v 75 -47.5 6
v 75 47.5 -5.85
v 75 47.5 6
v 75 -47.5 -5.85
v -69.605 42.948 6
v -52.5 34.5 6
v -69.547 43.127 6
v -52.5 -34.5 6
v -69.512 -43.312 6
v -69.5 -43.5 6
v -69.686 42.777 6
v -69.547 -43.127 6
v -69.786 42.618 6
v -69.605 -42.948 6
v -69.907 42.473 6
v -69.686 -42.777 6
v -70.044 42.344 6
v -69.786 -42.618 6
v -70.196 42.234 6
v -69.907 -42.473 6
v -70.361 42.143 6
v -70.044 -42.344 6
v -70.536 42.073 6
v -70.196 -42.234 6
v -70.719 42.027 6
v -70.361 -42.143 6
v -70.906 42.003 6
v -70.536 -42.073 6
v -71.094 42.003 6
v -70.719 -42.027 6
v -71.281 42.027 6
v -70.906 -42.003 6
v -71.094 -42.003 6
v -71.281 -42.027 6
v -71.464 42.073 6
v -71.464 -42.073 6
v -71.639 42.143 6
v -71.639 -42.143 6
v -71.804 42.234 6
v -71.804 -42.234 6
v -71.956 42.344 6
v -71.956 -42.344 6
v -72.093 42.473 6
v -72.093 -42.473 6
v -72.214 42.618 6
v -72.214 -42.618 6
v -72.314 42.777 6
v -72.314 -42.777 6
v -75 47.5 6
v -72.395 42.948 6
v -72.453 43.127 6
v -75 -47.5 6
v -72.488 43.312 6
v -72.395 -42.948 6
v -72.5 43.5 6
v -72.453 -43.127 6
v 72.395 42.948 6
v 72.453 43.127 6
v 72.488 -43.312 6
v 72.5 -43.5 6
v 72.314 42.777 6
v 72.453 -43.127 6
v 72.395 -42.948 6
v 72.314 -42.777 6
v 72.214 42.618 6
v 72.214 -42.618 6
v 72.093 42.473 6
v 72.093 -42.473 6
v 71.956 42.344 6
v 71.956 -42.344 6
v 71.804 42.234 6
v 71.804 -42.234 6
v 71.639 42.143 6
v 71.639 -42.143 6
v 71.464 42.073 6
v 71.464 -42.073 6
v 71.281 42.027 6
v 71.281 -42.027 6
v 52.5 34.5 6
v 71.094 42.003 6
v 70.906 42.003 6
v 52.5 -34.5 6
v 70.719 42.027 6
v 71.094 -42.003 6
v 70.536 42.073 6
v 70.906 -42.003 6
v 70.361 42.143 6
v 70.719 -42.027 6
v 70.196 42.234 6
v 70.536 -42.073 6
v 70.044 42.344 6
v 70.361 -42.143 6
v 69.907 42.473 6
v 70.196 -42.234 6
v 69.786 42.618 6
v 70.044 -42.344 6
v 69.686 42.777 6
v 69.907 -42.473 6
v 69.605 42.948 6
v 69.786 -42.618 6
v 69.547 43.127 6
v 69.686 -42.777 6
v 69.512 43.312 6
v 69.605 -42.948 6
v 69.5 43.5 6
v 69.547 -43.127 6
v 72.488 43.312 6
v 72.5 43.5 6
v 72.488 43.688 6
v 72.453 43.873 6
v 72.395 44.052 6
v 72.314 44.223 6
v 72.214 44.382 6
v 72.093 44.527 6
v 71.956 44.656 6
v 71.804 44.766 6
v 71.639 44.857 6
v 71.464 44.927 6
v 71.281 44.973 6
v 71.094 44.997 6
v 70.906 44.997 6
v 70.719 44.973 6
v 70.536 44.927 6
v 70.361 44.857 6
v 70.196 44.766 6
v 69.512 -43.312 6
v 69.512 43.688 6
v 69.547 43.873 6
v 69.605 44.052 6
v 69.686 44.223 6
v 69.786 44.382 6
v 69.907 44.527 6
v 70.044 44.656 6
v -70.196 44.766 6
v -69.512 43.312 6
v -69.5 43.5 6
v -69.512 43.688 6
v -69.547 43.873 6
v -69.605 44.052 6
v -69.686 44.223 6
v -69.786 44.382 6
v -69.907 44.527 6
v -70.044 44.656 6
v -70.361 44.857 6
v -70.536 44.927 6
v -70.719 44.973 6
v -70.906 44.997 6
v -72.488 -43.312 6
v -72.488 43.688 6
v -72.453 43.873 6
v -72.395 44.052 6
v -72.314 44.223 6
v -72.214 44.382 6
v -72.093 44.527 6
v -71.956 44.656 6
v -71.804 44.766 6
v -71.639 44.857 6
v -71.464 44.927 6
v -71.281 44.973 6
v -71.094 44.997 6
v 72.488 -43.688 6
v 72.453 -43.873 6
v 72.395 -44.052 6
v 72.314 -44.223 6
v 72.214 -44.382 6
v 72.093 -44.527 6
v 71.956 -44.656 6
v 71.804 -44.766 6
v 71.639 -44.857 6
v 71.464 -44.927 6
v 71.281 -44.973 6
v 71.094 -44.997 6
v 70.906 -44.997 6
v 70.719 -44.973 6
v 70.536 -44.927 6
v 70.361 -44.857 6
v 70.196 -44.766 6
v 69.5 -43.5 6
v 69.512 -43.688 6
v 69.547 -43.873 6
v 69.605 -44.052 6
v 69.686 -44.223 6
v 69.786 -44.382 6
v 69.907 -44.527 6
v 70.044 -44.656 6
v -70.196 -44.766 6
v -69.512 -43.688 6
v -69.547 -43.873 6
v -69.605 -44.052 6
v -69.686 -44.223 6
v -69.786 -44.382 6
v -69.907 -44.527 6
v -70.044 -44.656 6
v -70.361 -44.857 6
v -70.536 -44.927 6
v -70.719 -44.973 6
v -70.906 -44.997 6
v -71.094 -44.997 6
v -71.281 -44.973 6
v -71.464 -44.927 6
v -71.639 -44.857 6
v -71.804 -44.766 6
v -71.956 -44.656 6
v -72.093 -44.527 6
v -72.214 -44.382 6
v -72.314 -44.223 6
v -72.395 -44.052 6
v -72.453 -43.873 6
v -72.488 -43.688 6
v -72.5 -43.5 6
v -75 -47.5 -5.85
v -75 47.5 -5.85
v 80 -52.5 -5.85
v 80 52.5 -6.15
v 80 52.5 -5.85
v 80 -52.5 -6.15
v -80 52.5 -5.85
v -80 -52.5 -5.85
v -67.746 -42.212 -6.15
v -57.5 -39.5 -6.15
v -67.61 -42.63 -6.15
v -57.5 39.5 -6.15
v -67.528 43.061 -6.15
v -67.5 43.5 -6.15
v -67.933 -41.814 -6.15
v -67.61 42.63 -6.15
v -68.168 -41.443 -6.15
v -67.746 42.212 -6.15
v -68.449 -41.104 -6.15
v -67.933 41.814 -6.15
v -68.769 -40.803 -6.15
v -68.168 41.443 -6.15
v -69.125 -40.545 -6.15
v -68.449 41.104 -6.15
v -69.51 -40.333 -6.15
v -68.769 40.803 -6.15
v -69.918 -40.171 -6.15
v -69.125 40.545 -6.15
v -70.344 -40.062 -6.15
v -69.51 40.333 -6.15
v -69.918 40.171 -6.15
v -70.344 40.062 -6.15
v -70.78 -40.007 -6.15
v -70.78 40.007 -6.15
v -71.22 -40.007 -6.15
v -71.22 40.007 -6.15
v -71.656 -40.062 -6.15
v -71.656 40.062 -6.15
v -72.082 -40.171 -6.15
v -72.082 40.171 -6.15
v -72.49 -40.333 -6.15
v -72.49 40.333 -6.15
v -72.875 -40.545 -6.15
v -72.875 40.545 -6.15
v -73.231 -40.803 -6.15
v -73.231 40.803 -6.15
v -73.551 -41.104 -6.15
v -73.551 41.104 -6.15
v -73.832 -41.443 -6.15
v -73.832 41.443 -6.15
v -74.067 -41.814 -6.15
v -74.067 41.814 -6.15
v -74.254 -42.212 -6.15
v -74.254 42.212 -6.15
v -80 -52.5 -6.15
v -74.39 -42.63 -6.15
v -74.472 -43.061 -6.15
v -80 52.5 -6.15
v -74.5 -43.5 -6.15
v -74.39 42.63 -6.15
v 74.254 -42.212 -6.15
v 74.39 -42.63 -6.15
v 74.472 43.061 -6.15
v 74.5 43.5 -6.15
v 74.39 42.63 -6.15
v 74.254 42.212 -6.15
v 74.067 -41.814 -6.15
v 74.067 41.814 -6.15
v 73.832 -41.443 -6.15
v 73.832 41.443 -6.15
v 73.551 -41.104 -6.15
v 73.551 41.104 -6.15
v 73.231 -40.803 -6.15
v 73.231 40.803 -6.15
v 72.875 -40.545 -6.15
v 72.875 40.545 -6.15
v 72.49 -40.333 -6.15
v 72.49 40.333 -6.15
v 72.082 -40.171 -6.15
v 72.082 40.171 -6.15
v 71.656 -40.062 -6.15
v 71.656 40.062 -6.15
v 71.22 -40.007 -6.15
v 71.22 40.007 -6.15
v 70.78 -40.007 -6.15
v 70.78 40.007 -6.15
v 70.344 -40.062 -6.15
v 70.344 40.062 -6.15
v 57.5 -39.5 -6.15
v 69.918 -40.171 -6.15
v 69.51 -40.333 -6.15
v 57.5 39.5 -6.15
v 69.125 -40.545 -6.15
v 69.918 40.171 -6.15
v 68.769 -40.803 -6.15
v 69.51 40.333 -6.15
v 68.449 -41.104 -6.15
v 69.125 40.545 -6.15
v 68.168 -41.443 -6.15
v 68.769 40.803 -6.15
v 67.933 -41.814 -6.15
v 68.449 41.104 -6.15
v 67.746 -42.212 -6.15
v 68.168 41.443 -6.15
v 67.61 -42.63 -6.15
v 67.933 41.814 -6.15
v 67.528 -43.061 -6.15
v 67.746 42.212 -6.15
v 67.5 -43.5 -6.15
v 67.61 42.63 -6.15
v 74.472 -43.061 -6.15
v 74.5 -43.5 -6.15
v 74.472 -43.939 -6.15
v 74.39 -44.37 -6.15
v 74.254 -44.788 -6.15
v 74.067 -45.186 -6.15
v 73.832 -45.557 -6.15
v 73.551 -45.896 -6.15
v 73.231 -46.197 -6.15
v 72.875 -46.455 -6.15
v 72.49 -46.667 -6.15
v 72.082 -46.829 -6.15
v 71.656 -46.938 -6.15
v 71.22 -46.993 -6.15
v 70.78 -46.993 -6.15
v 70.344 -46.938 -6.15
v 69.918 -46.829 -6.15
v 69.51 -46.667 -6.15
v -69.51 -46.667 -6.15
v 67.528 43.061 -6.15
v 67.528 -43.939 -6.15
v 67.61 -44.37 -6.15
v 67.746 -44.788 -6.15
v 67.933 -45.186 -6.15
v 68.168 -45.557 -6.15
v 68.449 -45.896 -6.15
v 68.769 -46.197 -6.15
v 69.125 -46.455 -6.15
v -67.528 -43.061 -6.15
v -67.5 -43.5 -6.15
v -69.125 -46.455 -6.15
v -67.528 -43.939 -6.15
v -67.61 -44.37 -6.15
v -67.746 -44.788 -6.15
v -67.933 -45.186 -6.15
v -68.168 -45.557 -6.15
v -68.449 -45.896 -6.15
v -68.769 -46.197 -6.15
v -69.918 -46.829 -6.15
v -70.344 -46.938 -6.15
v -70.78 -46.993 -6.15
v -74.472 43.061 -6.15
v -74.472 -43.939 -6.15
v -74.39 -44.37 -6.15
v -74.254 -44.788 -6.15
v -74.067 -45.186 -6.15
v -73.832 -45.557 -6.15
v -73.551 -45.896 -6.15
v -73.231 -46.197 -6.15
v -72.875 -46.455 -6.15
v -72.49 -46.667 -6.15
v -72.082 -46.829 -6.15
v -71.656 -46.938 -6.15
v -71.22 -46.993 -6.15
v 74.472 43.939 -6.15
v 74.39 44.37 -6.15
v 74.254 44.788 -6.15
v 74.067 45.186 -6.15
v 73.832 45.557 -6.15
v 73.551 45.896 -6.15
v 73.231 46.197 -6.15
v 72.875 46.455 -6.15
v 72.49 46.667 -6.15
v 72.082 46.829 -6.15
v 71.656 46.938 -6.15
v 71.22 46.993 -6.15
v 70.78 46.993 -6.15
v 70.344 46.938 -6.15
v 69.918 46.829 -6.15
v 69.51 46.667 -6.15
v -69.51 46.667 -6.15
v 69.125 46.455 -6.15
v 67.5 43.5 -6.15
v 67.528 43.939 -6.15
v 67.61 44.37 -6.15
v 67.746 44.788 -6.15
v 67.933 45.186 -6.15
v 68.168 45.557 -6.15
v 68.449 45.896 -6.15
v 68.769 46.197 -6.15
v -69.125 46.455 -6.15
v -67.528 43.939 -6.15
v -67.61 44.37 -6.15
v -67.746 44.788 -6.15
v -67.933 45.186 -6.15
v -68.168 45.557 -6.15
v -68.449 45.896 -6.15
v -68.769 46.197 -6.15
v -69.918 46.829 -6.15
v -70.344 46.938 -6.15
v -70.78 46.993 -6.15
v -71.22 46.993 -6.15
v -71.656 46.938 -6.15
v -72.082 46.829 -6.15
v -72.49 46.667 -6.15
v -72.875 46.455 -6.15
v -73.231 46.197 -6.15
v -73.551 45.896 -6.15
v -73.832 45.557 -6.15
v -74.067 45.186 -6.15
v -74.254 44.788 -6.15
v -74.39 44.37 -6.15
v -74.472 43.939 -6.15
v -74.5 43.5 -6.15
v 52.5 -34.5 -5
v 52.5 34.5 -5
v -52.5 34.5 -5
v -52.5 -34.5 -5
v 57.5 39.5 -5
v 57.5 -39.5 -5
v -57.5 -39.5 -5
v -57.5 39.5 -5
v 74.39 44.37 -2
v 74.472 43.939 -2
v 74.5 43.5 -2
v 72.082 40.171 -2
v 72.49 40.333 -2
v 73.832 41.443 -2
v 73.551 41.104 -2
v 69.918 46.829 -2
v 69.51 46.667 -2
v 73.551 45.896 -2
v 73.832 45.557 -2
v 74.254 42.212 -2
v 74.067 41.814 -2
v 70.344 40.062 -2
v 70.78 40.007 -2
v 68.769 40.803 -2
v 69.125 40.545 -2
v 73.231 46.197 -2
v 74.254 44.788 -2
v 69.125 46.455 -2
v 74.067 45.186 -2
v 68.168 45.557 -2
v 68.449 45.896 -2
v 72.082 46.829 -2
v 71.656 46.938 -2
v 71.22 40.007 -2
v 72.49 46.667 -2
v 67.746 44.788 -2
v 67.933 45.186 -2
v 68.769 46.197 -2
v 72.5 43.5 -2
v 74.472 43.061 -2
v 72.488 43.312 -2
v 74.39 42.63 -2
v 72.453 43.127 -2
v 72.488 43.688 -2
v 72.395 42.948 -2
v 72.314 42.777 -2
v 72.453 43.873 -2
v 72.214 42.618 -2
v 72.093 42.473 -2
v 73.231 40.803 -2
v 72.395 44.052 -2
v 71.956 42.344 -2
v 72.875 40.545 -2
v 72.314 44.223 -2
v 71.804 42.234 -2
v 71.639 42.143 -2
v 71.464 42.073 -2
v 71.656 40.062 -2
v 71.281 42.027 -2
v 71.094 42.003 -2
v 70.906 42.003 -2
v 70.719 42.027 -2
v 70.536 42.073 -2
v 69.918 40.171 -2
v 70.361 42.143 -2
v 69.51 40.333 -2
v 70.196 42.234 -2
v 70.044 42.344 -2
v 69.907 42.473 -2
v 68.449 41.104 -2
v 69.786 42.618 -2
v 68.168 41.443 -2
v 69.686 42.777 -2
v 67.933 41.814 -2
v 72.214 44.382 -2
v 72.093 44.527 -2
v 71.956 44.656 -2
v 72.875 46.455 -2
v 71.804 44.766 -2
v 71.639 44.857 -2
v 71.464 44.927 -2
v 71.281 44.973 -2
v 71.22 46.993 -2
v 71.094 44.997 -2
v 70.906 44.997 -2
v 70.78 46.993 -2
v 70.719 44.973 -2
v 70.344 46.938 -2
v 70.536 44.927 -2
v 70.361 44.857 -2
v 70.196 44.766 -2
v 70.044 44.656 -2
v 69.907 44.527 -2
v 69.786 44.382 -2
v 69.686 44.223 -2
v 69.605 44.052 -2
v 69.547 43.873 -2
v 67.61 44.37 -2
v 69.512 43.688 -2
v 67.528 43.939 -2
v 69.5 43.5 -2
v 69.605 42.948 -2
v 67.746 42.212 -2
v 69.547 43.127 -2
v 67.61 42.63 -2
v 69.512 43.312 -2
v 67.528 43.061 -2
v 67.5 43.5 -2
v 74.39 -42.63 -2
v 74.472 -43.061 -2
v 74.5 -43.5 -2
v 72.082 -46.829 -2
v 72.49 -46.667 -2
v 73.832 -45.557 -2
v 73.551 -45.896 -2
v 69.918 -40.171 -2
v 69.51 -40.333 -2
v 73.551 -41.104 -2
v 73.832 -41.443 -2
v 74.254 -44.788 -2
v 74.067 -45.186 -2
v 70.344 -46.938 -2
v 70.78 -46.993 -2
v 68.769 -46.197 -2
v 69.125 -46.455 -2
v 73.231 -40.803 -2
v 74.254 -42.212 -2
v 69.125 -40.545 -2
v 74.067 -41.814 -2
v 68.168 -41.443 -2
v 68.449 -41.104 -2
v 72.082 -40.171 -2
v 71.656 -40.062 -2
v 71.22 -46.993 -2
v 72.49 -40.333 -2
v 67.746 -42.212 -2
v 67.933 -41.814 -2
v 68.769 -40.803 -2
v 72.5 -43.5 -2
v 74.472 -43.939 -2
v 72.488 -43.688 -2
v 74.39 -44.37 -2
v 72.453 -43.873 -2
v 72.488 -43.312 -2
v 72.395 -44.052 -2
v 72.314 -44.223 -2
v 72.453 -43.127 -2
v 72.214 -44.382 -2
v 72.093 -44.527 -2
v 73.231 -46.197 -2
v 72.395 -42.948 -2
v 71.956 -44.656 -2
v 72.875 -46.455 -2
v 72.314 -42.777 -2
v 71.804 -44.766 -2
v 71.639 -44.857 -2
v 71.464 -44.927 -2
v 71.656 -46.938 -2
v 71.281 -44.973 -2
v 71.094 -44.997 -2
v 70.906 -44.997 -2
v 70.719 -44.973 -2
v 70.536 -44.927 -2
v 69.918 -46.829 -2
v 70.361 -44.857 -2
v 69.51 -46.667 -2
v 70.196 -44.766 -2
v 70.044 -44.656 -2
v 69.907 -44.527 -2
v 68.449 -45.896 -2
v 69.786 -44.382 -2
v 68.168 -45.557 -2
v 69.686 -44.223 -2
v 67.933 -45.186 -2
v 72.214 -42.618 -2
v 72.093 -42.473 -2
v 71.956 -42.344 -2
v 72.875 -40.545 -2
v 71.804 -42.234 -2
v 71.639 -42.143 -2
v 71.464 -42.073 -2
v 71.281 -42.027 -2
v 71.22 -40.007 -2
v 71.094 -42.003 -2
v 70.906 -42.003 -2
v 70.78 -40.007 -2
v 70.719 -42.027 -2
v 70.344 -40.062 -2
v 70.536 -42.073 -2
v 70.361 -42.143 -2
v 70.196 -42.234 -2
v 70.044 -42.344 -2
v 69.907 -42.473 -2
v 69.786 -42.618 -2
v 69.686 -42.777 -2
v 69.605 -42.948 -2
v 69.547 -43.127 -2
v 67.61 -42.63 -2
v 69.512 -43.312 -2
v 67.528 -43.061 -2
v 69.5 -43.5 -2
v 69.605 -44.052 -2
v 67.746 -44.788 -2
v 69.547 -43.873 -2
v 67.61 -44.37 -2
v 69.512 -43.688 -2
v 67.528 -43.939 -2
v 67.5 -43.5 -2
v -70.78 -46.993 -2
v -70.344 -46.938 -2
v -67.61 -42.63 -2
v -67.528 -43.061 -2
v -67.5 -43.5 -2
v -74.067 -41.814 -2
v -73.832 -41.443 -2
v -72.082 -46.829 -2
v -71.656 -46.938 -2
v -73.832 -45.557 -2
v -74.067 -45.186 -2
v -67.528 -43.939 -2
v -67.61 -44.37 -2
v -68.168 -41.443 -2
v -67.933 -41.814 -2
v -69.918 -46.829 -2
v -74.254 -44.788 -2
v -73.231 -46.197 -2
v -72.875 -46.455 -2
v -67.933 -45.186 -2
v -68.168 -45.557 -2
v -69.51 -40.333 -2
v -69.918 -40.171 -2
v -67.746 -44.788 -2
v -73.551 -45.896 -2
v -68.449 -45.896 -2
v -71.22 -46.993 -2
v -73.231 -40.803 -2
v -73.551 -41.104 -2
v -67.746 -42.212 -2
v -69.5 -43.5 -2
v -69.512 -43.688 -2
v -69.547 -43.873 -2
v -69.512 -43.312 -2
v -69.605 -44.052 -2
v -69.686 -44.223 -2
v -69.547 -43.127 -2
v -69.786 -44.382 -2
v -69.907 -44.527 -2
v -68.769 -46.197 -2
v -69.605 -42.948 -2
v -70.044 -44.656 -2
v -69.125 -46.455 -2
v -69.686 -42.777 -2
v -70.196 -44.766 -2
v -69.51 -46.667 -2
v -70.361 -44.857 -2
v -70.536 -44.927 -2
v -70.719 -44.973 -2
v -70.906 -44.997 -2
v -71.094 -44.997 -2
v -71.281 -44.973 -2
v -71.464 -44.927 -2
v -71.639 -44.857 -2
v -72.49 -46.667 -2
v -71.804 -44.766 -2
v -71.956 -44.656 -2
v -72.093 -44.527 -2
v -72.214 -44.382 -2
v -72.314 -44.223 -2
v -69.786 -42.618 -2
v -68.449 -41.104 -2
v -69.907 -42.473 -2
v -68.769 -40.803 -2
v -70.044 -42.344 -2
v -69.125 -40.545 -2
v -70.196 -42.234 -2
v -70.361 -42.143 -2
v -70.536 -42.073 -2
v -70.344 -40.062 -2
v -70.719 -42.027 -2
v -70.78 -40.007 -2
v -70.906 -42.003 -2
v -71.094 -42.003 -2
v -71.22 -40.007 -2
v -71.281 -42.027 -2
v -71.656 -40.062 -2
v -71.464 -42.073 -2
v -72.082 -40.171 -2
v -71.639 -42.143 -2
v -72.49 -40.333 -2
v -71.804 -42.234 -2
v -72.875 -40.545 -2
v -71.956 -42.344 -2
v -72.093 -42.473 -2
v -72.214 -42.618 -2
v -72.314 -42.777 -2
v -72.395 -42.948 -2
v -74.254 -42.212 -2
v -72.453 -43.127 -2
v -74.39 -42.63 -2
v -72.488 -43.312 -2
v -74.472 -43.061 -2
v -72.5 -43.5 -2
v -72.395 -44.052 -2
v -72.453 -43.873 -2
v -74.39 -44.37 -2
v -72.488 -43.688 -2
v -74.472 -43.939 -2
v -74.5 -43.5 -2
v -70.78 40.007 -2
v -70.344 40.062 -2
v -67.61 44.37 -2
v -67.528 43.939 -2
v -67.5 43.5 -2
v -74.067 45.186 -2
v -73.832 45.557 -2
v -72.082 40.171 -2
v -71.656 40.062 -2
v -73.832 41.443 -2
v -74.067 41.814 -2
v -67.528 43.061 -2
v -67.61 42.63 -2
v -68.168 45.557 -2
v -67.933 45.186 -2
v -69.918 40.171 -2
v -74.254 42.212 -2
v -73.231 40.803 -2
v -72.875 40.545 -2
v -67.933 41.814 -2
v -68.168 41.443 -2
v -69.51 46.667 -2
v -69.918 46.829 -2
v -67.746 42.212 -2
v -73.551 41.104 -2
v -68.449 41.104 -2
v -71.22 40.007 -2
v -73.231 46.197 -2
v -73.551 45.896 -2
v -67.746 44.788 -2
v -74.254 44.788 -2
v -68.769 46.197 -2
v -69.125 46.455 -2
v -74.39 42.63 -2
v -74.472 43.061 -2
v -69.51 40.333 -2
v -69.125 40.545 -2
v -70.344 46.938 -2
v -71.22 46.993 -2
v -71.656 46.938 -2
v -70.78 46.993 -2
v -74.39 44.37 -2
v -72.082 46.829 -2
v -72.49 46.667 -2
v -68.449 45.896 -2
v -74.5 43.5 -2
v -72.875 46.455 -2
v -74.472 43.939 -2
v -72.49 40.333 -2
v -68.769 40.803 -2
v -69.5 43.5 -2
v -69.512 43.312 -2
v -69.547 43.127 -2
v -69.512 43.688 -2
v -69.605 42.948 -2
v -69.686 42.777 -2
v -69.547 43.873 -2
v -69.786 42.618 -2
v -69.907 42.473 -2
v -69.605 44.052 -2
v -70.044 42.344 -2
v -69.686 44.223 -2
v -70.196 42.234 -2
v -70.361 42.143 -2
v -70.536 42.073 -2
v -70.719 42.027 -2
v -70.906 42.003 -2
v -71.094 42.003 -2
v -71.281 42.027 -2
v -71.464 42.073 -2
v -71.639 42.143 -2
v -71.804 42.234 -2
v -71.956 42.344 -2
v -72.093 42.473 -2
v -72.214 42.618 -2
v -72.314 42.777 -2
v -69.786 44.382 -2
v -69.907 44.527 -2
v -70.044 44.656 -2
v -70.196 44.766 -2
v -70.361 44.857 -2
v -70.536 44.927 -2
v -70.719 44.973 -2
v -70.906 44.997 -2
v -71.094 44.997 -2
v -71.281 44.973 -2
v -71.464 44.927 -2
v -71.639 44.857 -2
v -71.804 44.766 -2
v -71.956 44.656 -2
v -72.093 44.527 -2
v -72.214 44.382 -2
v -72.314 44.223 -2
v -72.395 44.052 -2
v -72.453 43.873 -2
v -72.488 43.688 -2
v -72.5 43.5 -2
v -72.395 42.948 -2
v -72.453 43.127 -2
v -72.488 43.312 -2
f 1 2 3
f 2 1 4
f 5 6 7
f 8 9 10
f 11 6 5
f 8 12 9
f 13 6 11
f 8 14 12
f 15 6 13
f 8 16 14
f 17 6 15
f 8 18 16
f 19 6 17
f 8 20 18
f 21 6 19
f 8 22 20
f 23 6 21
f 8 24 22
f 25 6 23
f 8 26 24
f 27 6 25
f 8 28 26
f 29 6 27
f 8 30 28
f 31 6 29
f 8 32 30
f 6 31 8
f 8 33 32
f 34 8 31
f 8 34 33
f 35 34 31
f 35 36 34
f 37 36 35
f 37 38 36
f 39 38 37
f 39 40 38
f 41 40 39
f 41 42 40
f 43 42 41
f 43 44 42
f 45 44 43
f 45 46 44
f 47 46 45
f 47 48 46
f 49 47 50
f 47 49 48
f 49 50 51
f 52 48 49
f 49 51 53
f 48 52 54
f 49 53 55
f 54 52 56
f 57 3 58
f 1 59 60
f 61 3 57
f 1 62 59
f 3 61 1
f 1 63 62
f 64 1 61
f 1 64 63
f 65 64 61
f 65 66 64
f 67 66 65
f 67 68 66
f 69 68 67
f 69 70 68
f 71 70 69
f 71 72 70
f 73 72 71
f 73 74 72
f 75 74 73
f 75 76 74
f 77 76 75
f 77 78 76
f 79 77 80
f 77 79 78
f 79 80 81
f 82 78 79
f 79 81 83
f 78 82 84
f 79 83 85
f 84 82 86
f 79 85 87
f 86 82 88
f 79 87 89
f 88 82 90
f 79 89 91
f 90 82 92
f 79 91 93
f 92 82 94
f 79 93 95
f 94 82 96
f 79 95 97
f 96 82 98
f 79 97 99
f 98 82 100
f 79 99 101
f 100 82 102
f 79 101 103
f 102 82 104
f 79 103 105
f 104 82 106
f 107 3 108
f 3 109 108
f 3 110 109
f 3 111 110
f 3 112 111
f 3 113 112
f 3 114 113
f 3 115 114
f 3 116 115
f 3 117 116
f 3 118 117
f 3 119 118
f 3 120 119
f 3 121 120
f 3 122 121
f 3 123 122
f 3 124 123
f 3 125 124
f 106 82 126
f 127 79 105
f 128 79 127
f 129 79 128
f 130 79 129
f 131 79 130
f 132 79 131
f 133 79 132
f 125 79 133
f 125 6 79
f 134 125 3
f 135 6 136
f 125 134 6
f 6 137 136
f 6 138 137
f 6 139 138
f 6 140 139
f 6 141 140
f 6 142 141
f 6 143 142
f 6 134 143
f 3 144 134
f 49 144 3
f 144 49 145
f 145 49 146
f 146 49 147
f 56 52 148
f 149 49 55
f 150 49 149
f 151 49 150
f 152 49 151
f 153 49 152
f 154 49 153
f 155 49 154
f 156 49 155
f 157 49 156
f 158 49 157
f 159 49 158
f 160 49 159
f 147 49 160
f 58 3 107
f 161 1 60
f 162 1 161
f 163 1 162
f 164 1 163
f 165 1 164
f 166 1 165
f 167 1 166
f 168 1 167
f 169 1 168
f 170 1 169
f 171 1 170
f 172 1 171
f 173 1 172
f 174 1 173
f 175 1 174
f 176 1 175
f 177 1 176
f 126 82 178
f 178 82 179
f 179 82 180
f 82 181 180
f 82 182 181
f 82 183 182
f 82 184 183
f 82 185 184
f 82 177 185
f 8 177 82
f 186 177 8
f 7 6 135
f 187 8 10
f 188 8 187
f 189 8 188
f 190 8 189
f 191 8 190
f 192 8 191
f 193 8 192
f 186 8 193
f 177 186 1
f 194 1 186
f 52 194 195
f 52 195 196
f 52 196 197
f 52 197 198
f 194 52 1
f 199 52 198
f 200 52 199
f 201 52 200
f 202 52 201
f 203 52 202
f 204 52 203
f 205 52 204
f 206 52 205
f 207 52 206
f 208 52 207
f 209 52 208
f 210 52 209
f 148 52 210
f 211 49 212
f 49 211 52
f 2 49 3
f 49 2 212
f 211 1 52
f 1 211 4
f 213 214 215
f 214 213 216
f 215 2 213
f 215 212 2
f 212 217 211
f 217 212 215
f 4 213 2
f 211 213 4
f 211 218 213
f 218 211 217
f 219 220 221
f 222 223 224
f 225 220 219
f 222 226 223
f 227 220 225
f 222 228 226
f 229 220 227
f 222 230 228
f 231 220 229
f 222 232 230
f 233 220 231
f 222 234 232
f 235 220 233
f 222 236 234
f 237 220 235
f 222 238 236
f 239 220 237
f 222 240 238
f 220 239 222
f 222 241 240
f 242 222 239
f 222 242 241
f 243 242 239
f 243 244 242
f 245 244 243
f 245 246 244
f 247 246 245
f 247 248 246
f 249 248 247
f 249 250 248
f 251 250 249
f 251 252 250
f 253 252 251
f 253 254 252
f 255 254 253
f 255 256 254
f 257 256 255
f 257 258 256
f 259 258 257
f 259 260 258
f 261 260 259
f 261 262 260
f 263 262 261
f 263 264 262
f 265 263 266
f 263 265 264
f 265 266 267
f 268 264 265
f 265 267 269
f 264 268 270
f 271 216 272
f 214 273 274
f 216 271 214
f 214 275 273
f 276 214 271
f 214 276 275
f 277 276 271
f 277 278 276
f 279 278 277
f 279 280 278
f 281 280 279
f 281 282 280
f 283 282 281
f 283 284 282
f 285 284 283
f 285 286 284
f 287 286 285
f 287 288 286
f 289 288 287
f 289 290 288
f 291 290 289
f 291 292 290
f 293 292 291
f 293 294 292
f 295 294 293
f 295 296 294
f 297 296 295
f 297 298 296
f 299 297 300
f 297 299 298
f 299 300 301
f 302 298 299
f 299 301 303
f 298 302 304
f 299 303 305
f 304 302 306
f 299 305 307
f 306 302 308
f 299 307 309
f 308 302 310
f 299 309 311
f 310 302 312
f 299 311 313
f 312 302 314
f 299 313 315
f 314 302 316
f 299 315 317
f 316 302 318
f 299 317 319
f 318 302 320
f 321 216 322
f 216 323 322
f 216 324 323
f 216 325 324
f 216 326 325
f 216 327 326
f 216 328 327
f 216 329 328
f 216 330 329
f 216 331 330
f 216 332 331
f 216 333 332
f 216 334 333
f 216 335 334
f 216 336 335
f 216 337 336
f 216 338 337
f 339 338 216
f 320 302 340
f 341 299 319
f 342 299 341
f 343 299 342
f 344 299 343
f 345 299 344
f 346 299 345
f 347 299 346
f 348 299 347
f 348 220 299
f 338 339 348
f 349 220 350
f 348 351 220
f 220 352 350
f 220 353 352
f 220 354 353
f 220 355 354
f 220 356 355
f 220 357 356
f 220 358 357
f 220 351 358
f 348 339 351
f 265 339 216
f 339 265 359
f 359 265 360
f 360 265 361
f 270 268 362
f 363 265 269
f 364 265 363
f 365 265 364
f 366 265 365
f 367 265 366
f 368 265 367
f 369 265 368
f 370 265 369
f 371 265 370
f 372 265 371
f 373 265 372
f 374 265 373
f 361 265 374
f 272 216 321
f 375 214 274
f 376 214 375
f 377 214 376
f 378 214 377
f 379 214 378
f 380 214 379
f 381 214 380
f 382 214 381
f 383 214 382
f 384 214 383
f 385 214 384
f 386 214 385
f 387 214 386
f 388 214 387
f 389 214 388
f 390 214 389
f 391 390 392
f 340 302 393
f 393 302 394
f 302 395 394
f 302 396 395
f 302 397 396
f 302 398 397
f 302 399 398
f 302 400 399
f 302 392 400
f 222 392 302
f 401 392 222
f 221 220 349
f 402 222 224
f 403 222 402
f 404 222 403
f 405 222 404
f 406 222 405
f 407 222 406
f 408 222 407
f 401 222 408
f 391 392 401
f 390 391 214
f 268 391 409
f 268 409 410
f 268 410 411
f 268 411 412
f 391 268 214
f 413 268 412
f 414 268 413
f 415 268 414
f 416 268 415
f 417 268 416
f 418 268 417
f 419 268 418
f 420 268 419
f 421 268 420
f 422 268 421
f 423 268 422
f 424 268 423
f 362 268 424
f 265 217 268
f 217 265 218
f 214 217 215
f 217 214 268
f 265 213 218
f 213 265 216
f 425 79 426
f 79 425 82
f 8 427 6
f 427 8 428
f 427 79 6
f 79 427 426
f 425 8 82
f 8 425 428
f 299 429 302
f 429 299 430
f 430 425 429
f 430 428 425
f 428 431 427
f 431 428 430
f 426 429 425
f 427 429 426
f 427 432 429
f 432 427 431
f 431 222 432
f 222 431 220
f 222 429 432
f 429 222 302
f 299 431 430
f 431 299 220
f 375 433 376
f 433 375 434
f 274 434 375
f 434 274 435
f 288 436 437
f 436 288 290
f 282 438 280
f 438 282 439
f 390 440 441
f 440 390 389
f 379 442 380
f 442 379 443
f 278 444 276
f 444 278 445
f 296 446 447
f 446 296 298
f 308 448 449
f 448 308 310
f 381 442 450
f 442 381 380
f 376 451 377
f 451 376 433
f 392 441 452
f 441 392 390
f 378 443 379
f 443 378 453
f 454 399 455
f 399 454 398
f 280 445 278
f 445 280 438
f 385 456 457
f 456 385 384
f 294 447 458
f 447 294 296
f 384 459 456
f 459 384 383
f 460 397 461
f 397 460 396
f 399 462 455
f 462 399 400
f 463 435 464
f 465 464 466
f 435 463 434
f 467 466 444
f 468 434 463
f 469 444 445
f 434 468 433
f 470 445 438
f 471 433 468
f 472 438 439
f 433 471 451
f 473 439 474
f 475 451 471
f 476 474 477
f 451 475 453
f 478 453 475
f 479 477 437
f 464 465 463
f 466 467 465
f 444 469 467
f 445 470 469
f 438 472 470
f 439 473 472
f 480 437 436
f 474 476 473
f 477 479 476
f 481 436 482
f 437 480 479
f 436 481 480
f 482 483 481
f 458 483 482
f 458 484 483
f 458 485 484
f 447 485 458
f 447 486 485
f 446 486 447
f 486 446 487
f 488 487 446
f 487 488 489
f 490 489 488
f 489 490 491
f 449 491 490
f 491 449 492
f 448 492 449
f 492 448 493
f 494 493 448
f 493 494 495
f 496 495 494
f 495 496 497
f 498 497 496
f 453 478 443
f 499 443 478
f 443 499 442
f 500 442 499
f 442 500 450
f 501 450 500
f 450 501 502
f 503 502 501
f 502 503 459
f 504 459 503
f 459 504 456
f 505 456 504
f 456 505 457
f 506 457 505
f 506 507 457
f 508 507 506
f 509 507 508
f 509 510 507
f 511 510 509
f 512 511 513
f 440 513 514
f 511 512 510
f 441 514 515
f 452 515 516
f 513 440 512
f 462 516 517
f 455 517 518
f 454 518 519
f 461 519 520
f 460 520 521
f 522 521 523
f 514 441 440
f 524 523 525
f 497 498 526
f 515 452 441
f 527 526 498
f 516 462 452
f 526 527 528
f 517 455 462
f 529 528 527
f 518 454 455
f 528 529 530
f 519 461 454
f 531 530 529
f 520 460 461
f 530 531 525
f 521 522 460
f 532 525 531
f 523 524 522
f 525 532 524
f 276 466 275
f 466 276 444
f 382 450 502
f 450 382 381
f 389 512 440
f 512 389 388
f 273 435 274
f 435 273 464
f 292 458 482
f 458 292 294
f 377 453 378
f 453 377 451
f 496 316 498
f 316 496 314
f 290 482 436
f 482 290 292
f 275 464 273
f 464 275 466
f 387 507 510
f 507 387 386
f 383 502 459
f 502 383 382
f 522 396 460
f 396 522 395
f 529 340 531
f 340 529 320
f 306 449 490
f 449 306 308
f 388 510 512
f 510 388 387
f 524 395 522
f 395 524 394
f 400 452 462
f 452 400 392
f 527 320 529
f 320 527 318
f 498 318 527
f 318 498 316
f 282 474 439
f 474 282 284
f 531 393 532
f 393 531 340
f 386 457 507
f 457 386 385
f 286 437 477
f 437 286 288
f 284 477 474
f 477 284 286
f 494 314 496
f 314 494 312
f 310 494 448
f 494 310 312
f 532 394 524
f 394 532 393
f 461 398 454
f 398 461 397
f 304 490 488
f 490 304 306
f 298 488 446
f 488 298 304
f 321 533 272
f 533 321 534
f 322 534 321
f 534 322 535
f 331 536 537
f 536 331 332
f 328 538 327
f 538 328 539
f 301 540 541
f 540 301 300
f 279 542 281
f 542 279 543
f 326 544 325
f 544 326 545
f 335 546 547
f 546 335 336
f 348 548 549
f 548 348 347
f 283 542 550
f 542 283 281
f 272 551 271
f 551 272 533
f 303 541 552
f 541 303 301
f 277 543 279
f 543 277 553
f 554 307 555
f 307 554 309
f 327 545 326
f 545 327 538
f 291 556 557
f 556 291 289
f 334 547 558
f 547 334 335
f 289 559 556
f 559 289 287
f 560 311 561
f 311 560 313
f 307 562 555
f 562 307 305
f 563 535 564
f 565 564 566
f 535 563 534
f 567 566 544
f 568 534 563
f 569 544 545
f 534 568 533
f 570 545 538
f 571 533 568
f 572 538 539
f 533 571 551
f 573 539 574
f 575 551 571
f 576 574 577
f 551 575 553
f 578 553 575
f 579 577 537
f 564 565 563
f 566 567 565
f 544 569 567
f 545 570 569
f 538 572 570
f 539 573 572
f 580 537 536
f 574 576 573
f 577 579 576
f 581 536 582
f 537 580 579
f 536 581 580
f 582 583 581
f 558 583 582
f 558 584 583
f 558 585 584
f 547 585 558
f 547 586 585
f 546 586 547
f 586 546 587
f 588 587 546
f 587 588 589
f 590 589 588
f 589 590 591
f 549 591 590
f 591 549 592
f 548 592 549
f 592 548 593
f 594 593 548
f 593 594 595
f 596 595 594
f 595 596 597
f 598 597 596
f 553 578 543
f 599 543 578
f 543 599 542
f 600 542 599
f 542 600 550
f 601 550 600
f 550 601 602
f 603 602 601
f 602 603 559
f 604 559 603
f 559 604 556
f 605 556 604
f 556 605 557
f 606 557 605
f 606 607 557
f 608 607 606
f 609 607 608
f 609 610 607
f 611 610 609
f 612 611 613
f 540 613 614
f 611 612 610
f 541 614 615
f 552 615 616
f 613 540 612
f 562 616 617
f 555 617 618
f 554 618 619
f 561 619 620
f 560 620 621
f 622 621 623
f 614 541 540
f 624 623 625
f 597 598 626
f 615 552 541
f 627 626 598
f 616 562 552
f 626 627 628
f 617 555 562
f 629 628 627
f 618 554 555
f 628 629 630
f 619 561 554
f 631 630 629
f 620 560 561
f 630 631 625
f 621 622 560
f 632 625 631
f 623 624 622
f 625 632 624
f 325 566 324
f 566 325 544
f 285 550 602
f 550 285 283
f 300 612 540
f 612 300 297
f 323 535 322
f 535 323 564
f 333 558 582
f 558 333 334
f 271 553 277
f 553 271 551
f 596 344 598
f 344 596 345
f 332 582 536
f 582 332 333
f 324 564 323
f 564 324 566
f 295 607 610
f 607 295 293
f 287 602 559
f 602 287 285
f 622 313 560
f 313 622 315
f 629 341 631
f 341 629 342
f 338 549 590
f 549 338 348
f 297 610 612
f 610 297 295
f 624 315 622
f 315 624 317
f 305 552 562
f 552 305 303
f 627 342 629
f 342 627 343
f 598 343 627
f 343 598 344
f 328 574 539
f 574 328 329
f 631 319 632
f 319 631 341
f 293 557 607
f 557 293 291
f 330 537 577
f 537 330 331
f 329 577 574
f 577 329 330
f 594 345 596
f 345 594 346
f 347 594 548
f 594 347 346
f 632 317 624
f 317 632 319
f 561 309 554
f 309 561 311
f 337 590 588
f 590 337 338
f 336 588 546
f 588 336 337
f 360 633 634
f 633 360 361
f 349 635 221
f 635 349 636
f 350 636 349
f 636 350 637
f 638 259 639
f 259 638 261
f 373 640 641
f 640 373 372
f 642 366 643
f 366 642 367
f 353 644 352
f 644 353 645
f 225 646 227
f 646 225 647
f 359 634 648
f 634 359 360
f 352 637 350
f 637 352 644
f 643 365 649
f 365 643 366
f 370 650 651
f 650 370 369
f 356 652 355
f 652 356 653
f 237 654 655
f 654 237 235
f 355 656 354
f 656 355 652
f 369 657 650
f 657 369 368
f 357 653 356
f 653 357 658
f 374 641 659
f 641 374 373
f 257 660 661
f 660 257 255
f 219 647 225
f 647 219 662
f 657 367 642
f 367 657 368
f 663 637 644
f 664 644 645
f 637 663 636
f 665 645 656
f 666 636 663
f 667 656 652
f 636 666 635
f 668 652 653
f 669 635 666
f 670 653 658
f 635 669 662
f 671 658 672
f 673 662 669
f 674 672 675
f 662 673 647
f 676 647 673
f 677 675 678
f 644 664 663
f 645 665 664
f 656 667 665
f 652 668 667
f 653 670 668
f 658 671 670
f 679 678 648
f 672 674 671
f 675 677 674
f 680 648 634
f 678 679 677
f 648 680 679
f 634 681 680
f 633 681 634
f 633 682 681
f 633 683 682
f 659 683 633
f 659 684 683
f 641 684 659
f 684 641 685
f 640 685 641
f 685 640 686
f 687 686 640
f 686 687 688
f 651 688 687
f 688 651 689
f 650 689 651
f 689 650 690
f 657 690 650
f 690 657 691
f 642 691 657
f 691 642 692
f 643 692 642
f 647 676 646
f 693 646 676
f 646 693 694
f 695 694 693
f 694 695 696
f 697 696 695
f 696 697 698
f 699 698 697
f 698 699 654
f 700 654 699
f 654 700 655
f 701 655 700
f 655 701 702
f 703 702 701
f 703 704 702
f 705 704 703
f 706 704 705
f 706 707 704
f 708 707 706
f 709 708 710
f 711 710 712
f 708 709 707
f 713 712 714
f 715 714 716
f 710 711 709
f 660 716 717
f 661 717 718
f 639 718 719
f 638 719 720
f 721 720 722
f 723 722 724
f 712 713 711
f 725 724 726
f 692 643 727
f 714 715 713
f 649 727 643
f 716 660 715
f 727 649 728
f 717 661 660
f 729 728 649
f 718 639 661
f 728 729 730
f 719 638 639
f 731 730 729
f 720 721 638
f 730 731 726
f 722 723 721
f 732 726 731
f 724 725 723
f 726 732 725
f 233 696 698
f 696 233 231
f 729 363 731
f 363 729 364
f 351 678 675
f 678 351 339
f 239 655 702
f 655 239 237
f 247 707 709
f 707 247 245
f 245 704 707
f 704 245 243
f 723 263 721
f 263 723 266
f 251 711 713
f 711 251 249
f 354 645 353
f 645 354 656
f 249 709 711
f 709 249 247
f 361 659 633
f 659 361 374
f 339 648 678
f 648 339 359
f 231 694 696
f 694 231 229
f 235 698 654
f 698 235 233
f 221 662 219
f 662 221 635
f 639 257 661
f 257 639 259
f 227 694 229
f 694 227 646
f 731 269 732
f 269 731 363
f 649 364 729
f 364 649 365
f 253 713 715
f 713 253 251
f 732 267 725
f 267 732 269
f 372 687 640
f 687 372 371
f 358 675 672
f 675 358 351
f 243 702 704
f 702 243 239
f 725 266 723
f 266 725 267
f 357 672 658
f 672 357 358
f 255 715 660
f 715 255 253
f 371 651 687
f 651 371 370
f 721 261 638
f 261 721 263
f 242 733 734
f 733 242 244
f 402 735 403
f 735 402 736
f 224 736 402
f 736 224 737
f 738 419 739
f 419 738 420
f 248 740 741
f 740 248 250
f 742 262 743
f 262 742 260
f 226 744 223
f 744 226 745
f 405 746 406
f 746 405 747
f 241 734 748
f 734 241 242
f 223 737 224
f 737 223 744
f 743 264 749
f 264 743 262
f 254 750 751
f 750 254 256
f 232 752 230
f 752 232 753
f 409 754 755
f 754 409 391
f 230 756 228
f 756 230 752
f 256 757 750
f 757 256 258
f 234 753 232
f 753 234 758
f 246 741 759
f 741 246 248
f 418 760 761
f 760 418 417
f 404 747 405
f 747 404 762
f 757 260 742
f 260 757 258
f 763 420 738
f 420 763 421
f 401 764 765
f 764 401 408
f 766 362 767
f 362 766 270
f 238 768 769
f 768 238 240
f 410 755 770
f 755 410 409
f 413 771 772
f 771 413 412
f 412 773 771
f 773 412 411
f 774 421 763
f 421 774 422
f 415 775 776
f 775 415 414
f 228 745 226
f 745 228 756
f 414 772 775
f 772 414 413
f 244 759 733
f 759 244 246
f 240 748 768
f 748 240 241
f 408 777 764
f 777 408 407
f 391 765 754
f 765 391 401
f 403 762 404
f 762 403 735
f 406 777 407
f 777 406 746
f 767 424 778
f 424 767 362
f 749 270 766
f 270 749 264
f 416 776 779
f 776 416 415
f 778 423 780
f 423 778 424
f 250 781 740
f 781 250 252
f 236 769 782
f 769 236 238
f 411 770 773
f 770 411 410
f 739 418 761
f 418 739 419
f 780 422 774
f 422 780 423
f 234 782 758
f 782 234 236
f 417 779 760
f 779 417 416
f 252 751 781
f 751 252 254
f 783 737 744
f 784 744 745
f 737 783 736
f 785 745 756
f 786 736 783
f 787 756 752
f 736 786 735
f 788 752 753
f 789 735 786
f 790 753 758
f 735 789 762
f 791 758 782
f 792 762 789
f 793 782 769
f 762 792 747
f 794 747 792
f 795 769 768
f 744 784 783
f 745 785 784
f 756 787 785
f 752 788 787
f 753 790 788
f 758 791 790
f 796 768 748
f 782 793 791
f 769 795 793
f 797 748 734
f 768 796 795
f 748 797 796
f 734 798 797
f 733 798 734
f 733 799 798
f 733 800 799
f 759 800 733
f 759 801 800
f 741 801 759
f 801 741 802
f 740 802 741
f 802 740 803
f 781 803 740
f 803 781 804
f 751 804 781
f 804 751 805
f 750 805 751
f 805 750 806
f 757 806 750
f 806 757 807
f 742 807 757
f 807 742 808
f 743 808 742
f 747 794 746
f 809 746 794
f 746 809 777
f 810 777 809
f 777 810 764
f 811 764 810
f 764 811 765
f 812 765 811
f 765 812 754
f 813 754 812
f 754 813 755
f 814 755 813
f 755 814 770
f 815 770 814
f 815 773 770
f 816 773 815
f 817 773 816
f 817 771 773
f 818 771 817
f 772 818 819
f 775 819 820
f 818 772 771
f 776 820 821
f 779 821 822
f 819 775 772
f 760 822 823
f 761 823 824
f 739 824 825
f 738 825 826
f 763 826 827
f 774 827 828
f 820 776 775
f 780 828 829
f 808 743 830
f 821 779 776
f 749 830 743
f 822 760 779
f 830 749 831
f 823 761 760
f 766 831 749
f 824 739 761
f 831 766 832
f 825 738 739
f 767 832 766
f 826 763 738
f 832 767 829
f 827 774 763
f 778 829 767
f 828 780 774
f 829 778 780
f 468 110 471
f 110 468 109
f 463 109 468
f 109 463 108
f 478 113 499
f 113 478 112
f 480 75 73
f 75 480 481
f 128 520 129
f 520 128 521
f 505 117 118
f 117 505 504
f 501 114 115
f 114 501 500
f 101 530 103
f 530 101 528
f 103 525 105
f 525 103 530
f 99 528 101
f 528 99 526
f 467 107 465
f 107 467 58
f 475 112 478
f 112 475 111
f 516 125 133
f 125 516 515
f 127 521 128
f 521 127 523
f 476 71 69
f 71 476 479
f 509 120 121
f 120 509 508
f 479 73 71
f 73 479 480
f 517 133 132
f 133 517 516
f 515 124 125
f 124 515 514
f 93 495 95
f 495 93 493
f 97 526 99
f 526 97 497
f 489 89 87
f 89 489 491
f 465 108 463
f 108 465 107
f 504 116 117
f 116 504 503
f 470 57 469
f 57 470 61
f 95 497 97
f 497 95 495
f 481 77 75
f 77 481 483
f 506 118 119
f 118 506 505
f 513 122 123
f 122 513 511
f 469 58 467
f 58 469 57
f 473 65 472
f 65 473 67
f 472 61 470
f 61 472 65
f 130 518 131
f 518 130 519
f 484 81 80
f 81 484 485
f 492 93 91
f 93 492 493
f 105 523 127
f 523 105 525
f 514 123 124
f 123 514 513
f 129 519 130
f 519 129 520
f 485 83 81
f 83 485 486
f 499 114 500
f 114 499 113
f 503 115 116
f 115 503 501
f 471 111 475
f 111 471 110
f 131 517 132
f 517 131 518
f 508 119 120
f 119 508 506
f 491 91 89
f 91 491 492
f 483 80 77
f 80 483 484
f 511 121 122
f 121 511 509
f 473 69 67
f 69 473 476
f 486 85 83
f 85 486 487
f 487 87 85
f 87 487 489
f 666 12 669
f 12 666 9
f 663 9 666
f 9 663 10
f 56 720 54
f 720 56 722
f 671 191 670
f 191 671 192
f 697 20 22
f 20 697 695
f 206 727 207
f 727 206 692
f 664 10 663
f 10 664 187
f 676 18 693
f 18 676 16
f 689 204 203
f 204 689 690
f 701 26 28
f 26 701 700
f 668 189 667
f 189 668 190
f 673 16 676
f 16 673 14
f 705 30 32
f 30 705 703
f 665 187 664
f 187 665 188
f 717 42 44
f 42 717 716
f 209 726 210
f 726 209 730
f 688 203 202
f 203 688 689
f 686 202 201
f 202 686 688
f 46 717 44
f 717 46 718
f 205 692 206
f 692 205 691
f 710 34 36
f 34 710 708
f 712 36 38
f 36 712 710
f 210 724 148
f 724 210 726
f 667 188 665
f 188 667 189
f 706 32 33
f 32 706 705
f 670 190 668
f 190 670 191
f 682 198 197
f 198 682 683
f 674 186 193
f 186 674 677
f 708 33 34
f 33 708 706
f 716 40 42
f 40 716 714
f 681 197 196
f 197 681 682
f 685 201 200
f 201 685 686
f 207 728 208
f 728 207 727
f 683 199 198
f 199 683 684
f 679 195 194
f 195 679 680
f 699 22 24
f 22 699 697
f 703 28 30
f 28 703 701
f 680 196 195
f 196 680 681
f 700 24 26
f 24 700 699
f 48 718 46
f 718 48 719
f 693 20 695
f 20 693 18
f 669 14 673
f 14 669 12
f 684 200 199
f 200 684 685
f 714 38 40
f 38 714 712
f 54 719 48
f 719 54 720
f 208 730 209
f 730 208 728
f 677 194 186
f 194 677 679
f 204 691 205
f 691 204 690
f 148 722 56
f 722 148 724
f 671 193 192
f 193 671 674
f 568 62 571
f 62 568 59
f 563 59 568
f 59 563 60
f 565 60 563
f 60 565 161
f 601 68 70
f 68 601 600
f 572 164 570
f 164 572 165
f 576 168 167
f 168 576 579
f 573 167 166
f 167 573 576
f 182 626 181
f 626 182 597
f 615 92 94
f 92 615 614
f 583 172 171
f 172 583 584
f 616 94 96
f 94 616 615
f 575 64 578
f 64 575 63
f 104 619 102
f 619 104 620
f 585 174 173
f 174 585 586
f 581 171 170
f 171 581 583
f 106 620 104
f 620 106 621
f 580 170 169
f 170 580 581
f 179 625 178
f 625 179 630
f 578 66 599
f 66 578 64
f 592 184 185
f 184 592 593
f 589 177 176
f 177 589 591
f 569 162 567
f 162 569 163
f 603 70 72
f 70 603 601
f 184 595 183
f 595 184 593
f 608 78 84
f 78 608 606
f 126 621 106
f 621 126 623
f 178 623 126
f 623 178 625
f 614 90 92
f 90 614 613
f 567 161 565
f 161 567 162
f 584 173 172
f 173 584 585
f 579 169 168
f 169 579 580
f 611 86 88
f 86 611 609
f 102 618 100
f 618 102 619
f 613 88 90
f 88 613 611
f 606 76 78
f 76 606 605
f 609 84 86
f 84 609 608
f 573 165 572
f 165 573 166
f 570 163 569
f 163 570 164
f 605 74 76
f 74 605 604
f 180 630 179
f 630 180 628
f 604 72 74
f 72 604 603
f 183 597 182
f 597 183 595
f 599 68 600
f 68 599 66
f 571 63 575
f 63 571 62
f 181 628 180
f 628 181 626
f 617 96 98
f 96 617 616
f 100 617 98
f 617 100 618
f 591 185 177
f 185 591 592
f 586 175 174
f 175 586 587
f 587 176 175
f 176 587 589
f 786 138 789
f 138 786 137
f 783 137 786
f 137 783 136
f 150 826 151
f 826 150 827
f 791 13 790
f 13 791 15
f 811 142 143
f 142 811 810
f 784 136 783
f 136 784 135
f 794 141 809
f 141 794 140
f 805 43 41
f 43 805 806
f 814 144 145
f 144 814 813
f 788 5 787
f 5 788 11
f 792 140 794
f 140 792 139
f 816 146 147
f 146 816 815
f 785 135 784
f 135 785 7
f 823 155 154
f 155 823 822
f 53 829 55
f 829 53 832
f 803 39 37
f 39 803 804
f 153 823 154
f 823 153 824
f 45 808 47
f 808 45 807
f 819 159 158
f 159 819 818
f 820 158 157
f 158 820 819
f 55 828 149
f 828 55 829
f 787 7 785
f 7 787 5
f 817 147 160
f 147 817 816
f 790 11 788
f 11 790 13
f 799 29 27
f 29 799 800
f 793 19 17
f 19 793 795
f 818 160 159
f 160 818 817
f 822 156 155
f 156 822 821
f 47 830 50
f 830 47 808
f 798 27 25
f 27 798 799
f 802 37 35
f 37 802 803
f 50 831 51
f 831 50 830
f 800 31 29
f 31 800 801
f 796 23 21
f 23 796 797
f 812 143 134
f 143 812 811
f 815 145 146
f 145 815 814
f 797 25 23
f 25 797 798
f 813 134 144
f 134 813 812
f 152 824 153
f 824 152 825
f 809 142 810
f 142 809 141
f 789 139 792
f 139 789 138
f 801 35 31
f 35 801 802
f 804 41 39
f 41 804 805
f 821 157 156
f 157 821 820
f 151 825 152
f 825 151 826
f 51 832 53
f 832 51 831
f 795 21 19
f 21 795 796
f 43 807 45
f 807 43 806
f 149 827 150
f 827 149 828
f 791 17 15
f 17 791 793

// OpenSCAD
// --------------------- Configurable Items ---------------------

$fn = 50*1;  // Quality of holes... above 50 not necessary for such small holes. (Hidden in Customizer)

// Width of hole in wall (all measurements in MM)
hole_width = 150;

// Height of hole in wall
hole_height = 95;

// T3 Retrofit Box Width
T3_width = 105;

// T3 Retrofit Box Height
T3_height = 69;

// T3 Front Lip Border
T3_indent_width = 5;

// T3 Front Lip depth (for T3 flush to wall)
T3_indent_depth = 2;

// Adapter Lip Border and Thickness
front_lip_width = 5 * 1;      // Orig 5, Hidden in Customizer
front_lip_thickness = .3 * 1;  // Orig .3, Hidden in Customizer

sheetrock_thickness = 12 * 1;  // Orig 12, Hidden in Customizer

// --------------------- Configurable Items ---------------------

cs_radius = 3.5 * 1;  // Hidden in Customizer
screw_radius = 1.5 * 1;  // Hidden in Customizer

difference()
{
    // Solid (Additive) Objects...
    
    union()
    {
        cube([hole_width, hole_height, sheetrock_thickness], true);
        translate([0,0,-(sheetrock_thickness / 2)])
        {
            cube([hole_width + (front_lip_width*2), hole_height + (front_lip_width*2), front_lip_thickness], true);
        }
    }

    // Hole (Subtractive) Objects...
    
    // T3 main body
    cube([T3_width, T3_height, sheetrock_thickness+1], true);

    // T3 front face indent
    translate([0,0,-(sheetrock_thickness / 2)])
        cube([T3_width + (T3_indent_width * 2), T3_height + (T3_indent_width * 2), T3_indent_depth], true);

    // 4 Countersunk Holes
    hole_xpos = (hole_width/2) - 4;
    hole_ypos = (hole_height/2) - 4;

    // Countersinks
    translate([hole_xpos, hole_ypos, -(sheetrock_thickness/2)-10]) cylinder(sheetrock_thickness+2, cs_radius, cs_radius);
    translate([hole_xpos, -hole_ypos, -(sheetrock_thickness/2)-10]) cylinder(sheetrock_thickness+2, cs_radius, cs_radius);
    translate([-hole_xpos, -hole_ypos, -(sheetrock_thickness/2)-10]) cylinder(sheetrock_thickness+2, cs_radius, cs_radius);
    translate([-hole_xpos, hole_ypos, -(sheetrock_thickness/2)-10]) cylinder(sheetrock_thickness+2, cs_radius, cs_radius);

    // Holes
    translate([hole_xpos, hole_ypos, -(sheetrock_thickness/2)]) cylinder(sheetrock_thickness+2, screw_radius, screw_radius);
    translate([-hole_xpos, -hole_ypos, -(sheetrock_thickness/2)]) cylinder(sheetrock_thickness+2, screw_radius, screw_radius);
    translate([hole_xpos, -hole_ypos, -(sheetrock_thickness/2)]) cylinder(sheetrock_thickness+2, screw_radius, screw_radius);
    translate([-hole_xpos, hole_ypos, -(sheetrock_thickness/2)]) cylinder(sheetrock_thickness+2, screw_radius, screw_radius);

}
